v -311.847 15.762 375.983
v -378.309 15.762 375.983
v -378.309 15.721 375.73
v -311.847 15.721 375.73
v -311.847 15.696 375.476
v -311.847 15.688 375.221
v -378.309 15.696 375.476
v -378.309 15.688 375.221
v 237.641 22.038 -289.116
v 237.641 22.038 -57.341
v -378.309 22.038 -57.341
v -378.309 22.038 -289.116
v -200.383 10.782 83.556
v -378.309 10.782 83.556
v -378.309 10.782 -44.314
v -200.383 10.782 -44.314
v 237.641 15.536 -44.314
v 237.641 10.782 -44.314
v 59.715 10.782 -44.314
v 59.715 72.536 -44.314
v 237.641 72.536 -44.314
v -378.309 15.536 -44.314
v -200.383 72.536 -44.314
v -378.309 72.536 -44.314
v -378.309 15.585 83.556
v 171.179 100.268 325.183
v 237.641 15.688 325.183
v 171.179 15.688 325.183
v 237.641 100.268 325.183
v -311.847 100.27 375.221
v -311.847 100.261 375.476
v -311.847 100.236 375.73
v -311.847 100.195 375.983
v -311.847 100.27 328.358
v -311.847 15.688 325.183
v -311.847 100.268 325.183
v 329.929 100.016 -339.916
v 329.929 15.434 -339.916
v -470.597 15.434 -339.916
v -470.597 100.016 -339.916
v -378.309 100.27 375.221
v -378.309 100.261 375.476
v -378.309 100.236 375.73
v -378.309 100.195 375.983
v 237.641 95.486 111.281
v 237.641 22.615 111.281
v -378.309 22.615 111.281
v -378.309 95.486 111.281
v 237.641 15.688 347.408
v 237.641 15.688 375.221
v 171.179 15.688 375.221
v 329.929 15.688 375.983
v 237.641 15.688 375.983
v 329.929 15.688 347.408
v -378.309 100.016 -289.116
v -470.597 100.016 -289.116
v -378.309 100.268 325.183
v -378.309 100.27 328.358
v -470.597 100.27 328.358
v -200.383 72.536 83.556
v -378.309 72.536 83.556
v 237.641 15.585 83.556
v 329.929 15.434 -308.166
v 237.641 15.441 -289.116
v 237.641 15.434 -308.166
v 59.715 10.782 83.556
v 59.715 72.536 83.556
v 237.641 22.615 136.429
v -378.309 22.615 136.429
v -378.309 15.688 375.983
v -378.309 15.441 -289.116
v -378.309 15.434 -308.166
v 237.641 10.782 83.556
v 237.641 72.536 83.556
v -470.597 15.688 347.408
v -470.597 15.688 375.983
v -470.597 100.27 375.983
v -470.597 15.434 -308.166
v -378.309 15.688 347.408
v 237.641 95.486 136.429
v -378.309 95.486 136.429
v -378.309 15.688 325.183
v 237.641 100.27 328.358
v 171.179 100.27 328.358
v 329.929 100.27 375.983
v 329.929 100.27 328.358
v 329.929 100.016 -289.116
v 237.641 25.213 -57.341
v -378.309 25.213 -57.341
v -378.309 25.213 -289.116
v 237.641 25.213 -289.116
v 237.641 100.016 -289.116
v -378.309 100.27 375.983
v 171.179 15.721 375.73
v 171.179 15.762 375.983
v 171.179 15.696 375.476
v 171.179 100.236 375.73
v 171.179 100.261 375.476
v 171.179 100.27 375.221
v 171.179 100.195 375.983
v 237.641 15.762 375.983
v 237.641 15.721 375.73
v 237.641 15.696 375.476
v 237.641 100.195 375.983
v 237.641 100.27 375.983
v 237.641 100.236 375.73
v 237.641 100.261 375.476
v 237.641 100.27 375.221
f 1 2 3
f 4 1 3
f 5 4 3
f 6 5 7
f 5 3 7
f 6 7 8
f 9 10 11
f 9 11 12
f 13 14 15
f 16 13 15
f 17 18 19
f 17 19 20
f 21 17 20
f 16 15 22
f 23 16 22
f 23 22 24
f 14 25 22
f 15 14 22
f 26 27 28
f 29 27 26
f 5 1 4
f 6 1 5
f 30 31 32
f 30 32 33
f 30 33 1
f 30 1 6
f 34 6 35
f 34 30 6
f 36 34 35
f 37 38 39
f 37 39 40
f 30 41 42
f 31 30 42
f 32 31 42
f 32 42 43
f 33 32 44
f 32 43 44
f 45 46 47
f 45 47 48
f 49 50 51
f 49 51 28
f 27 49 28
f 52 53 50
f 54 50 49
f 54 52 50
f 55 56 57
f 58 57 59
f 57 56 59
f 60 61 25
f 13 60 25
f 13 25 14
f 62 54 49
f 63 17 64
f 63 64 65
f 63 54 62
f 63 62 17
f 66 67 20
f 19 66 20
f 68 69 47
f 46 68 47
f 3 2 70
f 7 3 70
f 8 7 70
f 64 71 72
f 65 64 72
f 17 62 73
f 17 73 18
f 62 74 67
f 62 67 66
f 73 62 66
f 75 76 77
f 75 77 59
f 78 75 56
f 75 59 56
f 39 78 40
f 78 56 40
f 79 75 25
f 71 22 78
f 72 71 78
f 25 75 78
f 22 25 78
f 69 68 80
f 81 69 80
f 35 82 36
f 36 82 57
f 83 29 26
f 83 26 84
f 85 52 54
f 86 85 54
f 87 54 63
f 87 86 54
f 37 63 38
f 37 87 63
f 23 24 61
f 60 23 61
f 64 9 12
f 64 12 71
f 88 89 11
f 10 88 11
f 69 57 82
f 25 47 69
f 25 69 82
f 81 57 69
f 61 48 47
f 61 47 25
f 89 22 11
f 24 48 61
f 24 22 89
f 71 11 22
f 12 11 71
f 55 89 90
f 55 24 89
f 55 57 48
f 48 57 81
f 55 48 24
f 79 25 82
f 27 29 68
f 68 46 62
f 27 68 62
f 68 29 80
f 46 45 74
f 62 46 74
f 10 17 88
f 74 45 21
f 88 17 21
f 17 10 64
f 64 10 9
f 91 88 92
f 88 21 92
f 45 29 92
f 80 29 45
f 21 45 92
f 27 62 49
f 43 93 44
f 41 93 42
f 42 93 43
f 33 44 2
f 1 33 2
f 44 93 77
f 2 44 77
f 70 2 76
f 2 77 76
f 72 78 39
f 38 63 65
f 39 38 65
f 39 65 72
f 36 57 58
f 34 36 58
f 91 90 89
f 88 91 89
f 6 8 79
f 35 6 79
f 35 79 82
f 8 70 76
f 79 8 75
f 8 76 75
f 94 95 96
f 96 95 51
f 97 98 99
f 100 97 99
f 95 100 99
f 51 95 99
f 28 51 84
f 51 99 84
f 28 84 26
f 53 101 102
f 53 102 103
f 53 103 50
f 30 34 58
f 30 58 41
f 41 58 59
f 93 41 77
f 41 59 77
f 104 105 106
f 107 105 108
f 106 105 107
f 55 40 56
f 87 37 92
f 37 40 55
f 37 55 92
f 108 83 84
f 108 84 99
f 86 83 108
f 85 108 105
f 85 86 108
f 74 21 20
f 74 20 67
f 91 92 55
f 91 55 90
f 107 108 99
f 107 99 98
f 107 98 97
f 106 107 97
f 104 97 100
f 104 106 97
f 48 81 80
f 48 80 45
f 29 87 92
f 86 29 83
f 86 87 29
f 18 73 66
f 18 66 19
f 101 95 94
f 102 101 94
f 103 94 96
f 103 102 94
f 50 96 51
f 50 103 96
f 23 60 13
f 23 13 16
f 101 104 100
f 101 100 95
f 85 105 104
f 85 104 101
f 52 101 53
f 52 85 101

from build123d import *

# Parameters (mm, degrees)
BOSS_EXTRUDE1_DEPTH = 92.28812
BOSS_EXTRUDE2_DEPTH = 66.46188
BOSS_EXTRUDE3_DEPTH = 307.975
BOSS_EXTRUDE4_DEPTH = 177.926
SKETCH6_W           = 25.148038513
SKETCH6_H           = 72.870812273
BOSS_EXTRUDE5_DEPTH = 307.975


with BuildPart() as part:
    # Sketch1 → Boss-Extrude1 (new body)
    with BuildSketch(Plane.ZY.offset(470.597286824)):
        Polygon((375.982707359, 100.269590084), (375.982707359, 15.687590084), (347.407707359, 15.687590084), (-308.166292641, 15.433590084), (-339.916292641, 15.433590084), (-339.916292641, 100.015590084), (-289.116292641, 100.015590084), (328.357707359, 100.269590084), align=None)
    extrude(amount=-BOSS_EXTRUDE1_DEPTH)

    # Sketch2 → Boss-Extrude2 (add)
    with BuildSketch(Plane(origin=(-378.309166646, 0, 0), x_dir=(0, 0, -1), z_dir=(1, 0, 0))):
        Polygon((-375.220707359, 18.862590084), (-344.232707359, 18.862590084), (-344.232707359, 15.687590084), (-325.182707359, 15.687590084), (-325.182707359, 97.094590084), (-375.220707359, 97.094590084), align=None)
        Polygon((-375.220707359, 100.269590084), (-375.220707359, 97.094590084), (-325.182707359, 97.094590084), (-325.182707359, 100.268284038), (-328.357707359, 100.269590084), align=None)
        with BuildLine():
            ThreePointArc((-375.982707359, 96.332590084), (-375.759522726, 96.871405452), (-375.220707359, 97.094590084))
            Line((-375.220707359, 97.094590084), (-375.220707359, 100.269590084))
            ThreePointArc((-375.220707359, 100.269590084), (-375.60352134, 100.250934436), (-375.982707359, 100.195144291))
            Line((-375.982707359, 100.195144291), (-375.982707359, 96.332590084))
        make_face()
        with BuildLine():
            ThreePointArc((-375.982707359, 19.624590084), (-375.759522726, 19.085774717), (-375.220707359, 18.862590084))
            Line((-375.220707359, 18.862590084), (-375.220707359, 97.094590084))
            ThreePointArc((-375.220707359, 97.094590084), (-375.759522726, 96.871405452), (-375.982707359, 96.332590084))
            Line((-375.982707359, 96.332590084), (-375.982707359, 19.624590084))
        make_face()
        Polygon((-344.232707359, 15.687590084), (-344.232707359, 18.862590084), (-375.220707359, 18.862590084), (-375.220707359, 15.687590084), (-347.407707359, 15.687590084), align=None)
        with BuildLine():
            Line((-375.220707359, 15.687590084), (-375.220707359, 18.862590084))
            ThreePointArc((-375.220707359, 18.862590084), (-375.759522726, 19.085774717), (-375.982707359, 19.624590084))
            Line((-375.982707359, 19.624590084), (-375.982707359, 15.762035878))
            ThreePointArc((-375.982707359, 15.762035878), (-375.60352134, 15.706245733), (-375.220707359, 15.687590084))
        make_face()
    extrude(amount=BOSS_EXTRUDE2_DEPTH)

    # Sketch3 → Boss-Extrude3 (add)
    with BuildSketch(Plane(origin=(-378.309166646, 0, 0), x_dir=(0, 0, -1), z_dir=(1, 0, 0))):
        Polygon((289.116292641, 100.015590084), (289.116292641, 25.212590084), (57.341292641, 25.212590084), (57.341292641, 22.037590084), (289.116292641, 22.037590084), (289.116292641, 15.440970945), (308.166292641, 15.433590084), (339.916292641, 15.433590084), (339.916292641, 100.015590084), align=None)
    extrude(amount=BOSS_EXTRUDE3_DEPTH)

    # Sketch4 → Boss-Extrude4 (add)
    with BuildSketch(Plane(origin=(-378.309166646, 0, 0), x_dir=(0, 0, -1), z_dir=(1, 0, 0))):
        with BuildLine():
            ThreePointArc((44.31439752, 41.659090084), (35.270733675, 63.492426094), (13.437397726, 72.536090084))
            ThreePointArc((13.437397726, 72.536090084), (-5.359329042, 66.155461235), (-16.387494219, 49.65064574))
            ThreePointArc((-16.387494219, 49.65064574), (-15.318667207, 30.412852027), (-3.052669821, 15.554170853))
            Line((-3.052669821, 15.554170853), (29.907231382, 15.541400647))
            ThreePointArc((29.907231382, 15.541400647), (38.295788177, 23.343808407), (43.262289258, 33.667534429))
            ThreePointArc((43.262289258, 33.667534429), (44.050240504, 37.628832847), (44.31439752, 41.659090084))
        make_face()
        with BuildLine():
            ThreePointArc((-22.8539205, 49.65064574), (-33.882085595, 66.155461173), (-52.678812238, 72.536090084))
            ThreePointArc((-52.678812238, 72.536090084), (-74.512148435, 63.492426054), (-83.555812238, 41.659089763))
            ThreePointArc((-83.555812238, 41.659089763), (-83.291655202, 37.628832688), (-82.503703977, 33.667534429))
            ThreePointArc((-82.503703977, 33.667534429), (-77.55849945, 23.372748372), (-69.209387458, 15.579803056))
            Line((-69.209387458, 15.579803056), (-36.168450647, 15.567001453))
            ThreePointArc((-36.168450647, 15.567001453), (-23.918377136, 30.424033264), (-22.8539205, 49.65064574))
        make_face()
        with BuildLine():
            Line((13.437397726, 72.536090084), (-52.678812238, 72.536090084))
            ThreePointArc((-52.678812238, 72.536090084), (-33.882085595, 66.155461173), (-22.8539205, 49.65064574))
            ThreePointArc((-22.8539205, 49.65064574), (-23.918377136, 30.424033264), (-36.168450647, 15.567001453))
            Line((-36.168450647, 15.567001453), (-3.052669821, 15.554170853))
            ThreePointArc((-3.052669821, 15.554170853), (-15.318667207, 30.412852027), (-16.387494219, 49.65064574))
            ThreePointArc((-16.387494219, 49.65064574), (-5.359329042, 66.155461235), (13.437397726, 72.536090084))
        make_face()
        with BuildLine():
            ThreePointArc((-52.678812238, 10.782090084), (-44.083938524, 12.002433583), (-36.168450647, 15.567001453))
            Line((-36.168450647, 15.567001453), (-69.209387458, 15.579803056))
            ThreePointArc((-69.209387458, 15.579803056), (-61.285175681, 12.005765865), (-52.678812238, 10.782090084))
        make_face()
        with BuildLine():
            Line((-3.052669821, 15.554170853), (-36.168450647, 15.567001453))
            ThreePointArc((-36.168450647, 15.567001453), (-44.083938524, 12.002433583), (-52.678812238, 10.782090084))
            Line((-52.678812238, 10.782090084), (13.437397518, 10.782090084))
            ThreePointArc((13.437397518, 10.782090084), (4.854054992, 11.999094129), (-3.052669821, 15.554170853))
        make_face()
        with BuildLine():
            Line((29.907231382, 15.541400647), (-3.052669821, 15.554170853))
            ThreePointArc((-3.052669821, 15.554170853), (4.854054992, 11.999094129), (13.437397518, 10.782090084))
            ThreePointArc((13.437397518, 10.782090084), (22.009247734, 11.995770768), (29.907231382, 15.541400647))
        make_face()
        with BuildLine():
            Line((44.31439752, 10.782090084), (44.31439752, 15.535818637))
            Line((44.31439752, 15.535818637), (29.907231382, 15.541400647))
            ThreePointArc((29.907231382, 15.541400647), (22.009247734, 11.995770768), (13.437397518, 10.782090084))
            Line((13.437397518, 10.782090084), (44.31439752, 10.782090084))
        make_face()
        with BuildLine():
            Line((-69.209387458, 15.579803056), (-83.555812238, 15.585361532))
            Line((-83.555812238, 15.585361532), (-83.555812238, 10.782090084))
            Line((-83.555812238, 10.782090084), (-52.678812238, 10.782090084))
            ThreePointArc((-52.678812238, 10.782090084), (-61.285175681, 12.005765865), (-69.209387458, 15.579803056))
        make_face()
        with BuildLine():
            ThreePointArc((-82.503703977, 33.667534429), (-83.291655202, 37.628832688), (-83.555812238, 41.659089763))
            Line((-83.555812238, 41.659089763), (-83.555812238, 15.585361532))
            Line((-83.555812238, 15.585361532), (-69.209387458, 15.579803056))
            ThreePointArc((-69.209387458, 15.579803056), (-77.55849945, 23.372748372), (-82.503703977, 33.667534429))
        make_face()
        with BuildLine():
            Line((-52.678812238, 72.536090084), (-83.555812238, 72.536090084))
            Line((-83.555812238, 72.536090084), (-83.555812238, 41.659089763))
            ThreePointArc((-83.555812238, 41.659089763), (-74.512148435, 63.492426054), (-52.678812238, 72.536090084))
        make_face()
        with BuildLine():
            Line((44.31439752, 72.536090084), (13.437397726, 72.536090084))
            ThreePointArc((13.437397726, 72.536090084), (35.270733675, 63.492426094), (44.31439752, 41.659090084))
            Line((44.31439752, 41.659090084), (44.31439752, 72.536090084))
        make_face()
        with BuildLine():
            Line((44.31439752, 15.535818637), (44.31439752, 41.659090084))
            ThreePointArc((44.31439752, 41.659090084), (44.050240504, 37.628832847), (43.262289258, 33.667534429))
            ThreePointArc((43.262289258, 33.667534429), (38.295788177, 23.343808407), (29.907231382, 15.541400647))
            Line((29.907231382, 15.541400647), (44.31439752, 15.535818637))
        make_face()
    extrude(amount=BOSS_EXTRUDE4_DEPTH)

    # Sketch6 → Boss-Extrude5 (add)
    with BuildSketch(Plane(origin=(-378.309166646, 0, 0), x_dir=(0, 0, -1), z_dir=(1, 0, 0))):
        with Locations((-123.855467844, 59.050323619)):
            Rectangle(SKETCH6_W, SKETCH6_H)
    extrude(amount=BOSS_EXTRUDE5_DEPTH)

    # Mirror1: part across plane


with BuildPart() as part_1:
    add(part.part)
    add(part.part.mirror(Plane(origin=(-70.334166646, 0, 0), x_dir=(0, 0, 1), z_dir=(1, 0, 0))))


solid = part_1.part
